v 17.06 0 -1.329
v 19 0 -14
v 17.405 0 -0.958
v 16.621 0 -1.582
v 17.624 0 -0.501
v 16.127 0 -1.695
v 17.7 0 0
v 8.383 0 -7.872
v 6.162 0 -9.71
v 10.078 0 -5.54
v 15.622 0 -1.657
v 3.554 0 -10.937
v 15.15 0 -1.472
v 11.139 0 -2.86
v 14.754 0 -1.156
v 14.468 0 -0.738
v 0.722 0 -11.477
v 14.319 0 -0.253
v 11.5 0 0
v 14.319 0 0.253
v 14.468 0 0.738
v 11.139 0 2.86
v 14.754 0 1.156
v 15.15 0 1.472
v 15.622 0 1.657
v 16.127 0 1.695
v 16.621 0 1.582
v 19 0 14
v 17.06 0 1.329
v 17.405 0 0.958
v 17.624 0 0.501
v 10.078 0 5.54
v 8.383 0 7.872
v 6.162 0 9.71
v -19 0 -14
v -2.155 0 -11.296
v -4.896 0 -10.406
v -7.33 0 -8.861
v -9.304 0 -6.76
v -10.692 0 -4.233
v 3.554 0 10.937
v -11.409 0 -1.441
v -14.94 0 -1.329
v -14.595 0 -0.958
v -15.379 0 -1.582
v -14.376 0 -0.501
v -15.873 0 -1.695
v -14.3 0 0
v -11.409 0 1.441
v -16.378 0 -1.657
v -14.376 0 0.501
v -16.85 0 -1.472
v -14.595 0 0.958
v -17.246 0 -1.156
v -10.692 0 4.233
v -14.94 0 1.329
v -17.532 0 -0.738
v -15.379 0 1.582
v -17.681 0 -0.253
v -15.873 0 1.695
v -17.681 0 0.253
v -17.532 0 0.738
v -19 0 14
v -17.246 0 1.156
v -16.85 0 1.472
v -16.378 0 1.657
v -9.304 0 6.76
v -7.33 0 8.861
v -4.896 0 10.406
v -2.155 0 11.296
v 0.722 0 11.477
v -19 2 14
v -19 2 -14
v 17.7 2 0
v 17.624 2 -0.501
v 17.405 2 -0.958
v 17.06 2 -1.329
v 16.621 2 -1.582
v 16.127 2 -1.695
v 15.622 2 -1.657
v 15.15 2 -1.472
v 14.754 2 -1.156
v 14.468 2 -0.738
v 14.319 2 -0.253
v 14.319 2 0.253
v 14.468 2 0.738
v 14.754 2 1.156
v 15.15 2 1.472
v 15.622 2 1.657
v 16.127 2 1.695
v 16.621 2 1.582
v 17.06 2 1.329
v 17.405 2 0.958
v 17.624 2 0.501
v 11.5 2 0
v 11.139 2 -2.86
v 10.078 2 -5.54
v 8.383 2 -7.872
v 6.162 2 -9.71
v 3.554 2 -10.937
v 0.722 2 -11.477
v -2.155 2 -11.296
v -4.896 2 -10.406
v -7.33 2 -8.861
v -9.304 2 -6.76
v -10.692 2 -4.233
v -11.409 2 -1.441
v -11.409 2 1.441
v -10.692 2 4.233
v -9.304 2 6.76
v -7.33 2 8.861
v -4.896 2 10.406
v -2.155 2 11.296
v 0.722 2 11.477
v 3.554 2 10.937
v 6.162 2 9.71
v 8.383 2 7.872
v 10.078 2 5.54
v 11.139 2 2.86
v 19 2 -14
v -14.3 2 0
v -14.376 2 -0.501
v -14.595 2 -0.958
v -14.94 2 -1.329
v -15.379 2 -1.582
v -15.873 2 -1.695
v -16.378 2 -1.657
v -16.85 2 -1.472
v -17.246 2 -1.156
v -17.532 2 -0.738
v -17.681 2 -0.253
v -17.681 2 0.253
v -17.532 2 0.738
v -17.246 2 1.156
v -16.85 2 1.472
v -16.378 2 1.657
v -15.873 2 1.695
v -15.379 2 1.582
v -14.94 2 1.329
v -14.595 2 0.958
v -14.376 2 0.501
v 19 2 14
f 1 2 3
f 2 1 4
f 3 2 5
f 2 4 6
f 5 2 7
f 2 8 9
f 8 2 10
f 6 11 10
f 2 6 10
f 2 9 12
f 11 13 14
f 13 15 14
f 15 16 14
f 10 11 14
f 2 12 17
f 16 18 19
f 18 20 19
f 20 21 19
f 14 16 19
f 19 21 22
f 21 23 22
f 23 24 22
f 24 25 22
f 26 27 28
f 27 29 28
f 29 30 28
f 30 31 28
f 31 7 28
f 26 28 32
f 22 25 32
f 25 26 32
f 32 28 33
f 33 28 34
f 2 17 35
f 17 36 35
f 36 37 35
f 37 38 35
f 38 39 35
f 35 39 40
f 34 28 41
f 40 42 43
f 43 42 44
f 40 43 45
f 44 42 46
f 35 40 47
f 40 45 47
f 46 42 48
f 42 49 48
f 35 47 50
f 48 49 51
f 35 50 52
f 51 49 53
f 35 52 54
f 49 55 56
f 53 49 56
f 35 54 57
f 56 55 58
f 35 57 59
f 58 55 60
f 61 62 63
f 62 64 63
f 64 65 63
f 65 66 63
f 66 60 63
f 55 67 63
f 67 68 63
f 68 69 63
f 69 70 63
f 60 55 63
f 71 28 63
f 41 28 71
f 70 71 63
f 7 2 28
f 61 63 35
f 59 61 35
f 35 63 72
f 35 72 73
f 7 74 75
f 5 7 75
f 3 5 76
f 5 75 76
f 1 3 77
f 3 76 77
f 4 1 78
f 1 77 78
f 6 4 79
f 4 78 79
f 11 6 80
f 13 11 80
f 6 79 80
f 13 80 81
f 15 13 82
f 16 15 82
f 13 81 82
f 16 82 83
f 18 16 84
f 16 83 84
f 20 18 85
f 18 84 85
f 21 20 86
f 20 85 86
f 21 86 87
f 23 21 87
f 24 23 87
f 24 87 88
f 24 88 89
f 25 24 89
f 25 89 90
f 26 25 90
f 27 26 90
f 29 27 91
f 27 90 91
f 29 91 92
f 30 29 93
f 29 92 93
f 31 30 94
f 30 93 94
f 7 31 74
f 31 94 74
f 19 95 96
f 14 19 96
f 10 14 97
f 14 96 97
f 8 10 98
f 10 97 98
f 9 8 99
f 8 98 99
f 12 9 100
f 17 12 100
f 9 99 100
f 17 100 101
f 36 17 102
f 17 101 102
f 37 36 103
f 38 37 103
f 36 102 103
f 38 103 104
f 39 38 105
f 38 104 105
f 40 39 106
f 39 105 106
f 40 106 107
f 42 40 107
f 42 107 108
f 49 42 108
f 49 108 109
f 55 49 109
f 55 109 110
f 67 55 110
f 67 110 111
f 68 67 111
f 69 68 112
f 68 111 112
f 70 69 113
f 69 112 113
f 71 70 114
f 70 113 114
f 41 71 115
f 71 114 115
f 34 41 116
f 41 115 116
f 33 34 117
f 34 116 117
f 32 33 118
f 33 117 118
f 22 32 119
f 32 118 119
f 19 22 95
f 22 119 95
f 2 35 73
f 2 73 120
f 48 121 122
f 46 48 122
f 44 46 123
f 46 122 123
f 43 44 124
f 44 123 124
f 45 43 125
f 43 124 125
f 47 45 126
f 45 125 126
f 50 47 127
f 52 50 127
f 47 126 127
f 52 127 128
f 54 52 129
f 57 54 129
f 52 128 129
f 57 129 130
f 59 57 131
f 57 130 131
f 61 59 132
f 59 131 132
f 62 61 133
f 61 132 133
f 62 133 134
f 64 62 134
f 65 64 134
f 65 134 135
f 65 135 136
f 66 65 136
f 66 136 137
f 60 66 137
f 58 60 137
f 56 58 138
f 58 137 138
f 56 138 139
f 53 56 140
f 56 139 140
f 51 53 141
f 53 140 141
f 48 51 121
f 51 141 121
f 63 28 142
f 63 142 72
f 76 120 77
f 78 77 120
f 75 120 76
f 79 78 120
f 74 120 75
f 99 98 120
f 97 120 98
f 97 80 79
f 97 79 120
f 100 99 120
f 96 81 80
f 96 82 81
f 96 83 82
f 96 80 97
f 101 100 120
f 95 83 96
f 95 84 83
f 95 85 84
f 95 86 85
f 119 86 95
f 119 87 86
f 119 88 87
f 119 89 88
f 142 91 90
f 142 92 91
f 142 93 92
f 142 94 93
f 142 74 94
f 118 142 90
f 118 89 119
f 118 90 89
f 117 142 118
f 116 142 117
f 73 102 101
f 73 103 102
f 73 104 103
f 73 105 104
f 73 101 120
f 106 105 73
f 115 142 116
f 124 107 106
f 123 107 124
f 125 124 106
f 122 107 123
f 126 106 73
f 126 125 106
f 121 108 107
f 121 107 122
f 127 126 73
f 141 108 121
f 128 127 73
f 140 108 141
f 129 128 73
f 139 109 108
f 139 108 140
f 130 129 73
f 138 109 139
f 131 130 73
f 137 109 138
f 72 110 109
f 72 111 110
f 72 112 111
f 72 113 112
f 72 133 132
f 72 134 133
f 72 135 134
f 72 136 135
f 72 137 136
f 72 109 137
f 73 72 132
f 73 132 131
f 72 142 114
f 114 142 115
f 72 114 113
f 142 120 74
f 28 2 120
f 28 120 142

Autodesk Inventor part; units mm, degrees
ref_plane "YZ Plane" through (0, 0, 0) normal (1, 0, 0) x (0, 1, 0)
ref_plane "XZ Plane" through (0, 0, 0) normal (0, 1, 0) x (-1, 0, 0)
ref_plane "XY Plane" through (0, 0, 0) normal (0, 0, 1) x (1, 0, 0)
sketch "スケッチ1" plane through (0, 0, 0) normal (0, 1, 0) x (-1, 0, 0)
  line L0 (19, -14) -> (-19, -14)
  line L1 (-19, -14) -> (-19, 14)
  line L2 (-19, 14) -> (19, 14)
  line L3 (19, 14) -> (19, -14)
  line L4 (0, -27.2114) -> (0, 0) construction
  line L5 (0, 0) -> (-35.5982, 0) construction
  dimension "d0" = 28
  dimension "d1" = 38
extrude "押し出し1" add sketch "スケッチ1" along normal blind 2
sketch "スケッチ2" plane through (0, 2, 0) normal (0, 1, 0) x (1, 0, 0)
  circle A0 centre (0, 0) radius 11.5
  circle A1 centre (-16, 0) radius 1.7
  circle A2 centre (16, 0) radius 1.7
  line L0 (-19, 14) -> (-19, -14) projected
  line L1 (19, -14) -> (19, 14) projected
  dimension "d4" = 23
  dimension "d5" = 3.4
  dimension "d6" = 3.4
  dimension "d7" = 3
  dimension "d8" = 3
extrude "押し出し2" cut sketch "スケッチ2" against normal through all
properties part number "HayashiProbeHead_up" material "ステンレス鋼 440C"
